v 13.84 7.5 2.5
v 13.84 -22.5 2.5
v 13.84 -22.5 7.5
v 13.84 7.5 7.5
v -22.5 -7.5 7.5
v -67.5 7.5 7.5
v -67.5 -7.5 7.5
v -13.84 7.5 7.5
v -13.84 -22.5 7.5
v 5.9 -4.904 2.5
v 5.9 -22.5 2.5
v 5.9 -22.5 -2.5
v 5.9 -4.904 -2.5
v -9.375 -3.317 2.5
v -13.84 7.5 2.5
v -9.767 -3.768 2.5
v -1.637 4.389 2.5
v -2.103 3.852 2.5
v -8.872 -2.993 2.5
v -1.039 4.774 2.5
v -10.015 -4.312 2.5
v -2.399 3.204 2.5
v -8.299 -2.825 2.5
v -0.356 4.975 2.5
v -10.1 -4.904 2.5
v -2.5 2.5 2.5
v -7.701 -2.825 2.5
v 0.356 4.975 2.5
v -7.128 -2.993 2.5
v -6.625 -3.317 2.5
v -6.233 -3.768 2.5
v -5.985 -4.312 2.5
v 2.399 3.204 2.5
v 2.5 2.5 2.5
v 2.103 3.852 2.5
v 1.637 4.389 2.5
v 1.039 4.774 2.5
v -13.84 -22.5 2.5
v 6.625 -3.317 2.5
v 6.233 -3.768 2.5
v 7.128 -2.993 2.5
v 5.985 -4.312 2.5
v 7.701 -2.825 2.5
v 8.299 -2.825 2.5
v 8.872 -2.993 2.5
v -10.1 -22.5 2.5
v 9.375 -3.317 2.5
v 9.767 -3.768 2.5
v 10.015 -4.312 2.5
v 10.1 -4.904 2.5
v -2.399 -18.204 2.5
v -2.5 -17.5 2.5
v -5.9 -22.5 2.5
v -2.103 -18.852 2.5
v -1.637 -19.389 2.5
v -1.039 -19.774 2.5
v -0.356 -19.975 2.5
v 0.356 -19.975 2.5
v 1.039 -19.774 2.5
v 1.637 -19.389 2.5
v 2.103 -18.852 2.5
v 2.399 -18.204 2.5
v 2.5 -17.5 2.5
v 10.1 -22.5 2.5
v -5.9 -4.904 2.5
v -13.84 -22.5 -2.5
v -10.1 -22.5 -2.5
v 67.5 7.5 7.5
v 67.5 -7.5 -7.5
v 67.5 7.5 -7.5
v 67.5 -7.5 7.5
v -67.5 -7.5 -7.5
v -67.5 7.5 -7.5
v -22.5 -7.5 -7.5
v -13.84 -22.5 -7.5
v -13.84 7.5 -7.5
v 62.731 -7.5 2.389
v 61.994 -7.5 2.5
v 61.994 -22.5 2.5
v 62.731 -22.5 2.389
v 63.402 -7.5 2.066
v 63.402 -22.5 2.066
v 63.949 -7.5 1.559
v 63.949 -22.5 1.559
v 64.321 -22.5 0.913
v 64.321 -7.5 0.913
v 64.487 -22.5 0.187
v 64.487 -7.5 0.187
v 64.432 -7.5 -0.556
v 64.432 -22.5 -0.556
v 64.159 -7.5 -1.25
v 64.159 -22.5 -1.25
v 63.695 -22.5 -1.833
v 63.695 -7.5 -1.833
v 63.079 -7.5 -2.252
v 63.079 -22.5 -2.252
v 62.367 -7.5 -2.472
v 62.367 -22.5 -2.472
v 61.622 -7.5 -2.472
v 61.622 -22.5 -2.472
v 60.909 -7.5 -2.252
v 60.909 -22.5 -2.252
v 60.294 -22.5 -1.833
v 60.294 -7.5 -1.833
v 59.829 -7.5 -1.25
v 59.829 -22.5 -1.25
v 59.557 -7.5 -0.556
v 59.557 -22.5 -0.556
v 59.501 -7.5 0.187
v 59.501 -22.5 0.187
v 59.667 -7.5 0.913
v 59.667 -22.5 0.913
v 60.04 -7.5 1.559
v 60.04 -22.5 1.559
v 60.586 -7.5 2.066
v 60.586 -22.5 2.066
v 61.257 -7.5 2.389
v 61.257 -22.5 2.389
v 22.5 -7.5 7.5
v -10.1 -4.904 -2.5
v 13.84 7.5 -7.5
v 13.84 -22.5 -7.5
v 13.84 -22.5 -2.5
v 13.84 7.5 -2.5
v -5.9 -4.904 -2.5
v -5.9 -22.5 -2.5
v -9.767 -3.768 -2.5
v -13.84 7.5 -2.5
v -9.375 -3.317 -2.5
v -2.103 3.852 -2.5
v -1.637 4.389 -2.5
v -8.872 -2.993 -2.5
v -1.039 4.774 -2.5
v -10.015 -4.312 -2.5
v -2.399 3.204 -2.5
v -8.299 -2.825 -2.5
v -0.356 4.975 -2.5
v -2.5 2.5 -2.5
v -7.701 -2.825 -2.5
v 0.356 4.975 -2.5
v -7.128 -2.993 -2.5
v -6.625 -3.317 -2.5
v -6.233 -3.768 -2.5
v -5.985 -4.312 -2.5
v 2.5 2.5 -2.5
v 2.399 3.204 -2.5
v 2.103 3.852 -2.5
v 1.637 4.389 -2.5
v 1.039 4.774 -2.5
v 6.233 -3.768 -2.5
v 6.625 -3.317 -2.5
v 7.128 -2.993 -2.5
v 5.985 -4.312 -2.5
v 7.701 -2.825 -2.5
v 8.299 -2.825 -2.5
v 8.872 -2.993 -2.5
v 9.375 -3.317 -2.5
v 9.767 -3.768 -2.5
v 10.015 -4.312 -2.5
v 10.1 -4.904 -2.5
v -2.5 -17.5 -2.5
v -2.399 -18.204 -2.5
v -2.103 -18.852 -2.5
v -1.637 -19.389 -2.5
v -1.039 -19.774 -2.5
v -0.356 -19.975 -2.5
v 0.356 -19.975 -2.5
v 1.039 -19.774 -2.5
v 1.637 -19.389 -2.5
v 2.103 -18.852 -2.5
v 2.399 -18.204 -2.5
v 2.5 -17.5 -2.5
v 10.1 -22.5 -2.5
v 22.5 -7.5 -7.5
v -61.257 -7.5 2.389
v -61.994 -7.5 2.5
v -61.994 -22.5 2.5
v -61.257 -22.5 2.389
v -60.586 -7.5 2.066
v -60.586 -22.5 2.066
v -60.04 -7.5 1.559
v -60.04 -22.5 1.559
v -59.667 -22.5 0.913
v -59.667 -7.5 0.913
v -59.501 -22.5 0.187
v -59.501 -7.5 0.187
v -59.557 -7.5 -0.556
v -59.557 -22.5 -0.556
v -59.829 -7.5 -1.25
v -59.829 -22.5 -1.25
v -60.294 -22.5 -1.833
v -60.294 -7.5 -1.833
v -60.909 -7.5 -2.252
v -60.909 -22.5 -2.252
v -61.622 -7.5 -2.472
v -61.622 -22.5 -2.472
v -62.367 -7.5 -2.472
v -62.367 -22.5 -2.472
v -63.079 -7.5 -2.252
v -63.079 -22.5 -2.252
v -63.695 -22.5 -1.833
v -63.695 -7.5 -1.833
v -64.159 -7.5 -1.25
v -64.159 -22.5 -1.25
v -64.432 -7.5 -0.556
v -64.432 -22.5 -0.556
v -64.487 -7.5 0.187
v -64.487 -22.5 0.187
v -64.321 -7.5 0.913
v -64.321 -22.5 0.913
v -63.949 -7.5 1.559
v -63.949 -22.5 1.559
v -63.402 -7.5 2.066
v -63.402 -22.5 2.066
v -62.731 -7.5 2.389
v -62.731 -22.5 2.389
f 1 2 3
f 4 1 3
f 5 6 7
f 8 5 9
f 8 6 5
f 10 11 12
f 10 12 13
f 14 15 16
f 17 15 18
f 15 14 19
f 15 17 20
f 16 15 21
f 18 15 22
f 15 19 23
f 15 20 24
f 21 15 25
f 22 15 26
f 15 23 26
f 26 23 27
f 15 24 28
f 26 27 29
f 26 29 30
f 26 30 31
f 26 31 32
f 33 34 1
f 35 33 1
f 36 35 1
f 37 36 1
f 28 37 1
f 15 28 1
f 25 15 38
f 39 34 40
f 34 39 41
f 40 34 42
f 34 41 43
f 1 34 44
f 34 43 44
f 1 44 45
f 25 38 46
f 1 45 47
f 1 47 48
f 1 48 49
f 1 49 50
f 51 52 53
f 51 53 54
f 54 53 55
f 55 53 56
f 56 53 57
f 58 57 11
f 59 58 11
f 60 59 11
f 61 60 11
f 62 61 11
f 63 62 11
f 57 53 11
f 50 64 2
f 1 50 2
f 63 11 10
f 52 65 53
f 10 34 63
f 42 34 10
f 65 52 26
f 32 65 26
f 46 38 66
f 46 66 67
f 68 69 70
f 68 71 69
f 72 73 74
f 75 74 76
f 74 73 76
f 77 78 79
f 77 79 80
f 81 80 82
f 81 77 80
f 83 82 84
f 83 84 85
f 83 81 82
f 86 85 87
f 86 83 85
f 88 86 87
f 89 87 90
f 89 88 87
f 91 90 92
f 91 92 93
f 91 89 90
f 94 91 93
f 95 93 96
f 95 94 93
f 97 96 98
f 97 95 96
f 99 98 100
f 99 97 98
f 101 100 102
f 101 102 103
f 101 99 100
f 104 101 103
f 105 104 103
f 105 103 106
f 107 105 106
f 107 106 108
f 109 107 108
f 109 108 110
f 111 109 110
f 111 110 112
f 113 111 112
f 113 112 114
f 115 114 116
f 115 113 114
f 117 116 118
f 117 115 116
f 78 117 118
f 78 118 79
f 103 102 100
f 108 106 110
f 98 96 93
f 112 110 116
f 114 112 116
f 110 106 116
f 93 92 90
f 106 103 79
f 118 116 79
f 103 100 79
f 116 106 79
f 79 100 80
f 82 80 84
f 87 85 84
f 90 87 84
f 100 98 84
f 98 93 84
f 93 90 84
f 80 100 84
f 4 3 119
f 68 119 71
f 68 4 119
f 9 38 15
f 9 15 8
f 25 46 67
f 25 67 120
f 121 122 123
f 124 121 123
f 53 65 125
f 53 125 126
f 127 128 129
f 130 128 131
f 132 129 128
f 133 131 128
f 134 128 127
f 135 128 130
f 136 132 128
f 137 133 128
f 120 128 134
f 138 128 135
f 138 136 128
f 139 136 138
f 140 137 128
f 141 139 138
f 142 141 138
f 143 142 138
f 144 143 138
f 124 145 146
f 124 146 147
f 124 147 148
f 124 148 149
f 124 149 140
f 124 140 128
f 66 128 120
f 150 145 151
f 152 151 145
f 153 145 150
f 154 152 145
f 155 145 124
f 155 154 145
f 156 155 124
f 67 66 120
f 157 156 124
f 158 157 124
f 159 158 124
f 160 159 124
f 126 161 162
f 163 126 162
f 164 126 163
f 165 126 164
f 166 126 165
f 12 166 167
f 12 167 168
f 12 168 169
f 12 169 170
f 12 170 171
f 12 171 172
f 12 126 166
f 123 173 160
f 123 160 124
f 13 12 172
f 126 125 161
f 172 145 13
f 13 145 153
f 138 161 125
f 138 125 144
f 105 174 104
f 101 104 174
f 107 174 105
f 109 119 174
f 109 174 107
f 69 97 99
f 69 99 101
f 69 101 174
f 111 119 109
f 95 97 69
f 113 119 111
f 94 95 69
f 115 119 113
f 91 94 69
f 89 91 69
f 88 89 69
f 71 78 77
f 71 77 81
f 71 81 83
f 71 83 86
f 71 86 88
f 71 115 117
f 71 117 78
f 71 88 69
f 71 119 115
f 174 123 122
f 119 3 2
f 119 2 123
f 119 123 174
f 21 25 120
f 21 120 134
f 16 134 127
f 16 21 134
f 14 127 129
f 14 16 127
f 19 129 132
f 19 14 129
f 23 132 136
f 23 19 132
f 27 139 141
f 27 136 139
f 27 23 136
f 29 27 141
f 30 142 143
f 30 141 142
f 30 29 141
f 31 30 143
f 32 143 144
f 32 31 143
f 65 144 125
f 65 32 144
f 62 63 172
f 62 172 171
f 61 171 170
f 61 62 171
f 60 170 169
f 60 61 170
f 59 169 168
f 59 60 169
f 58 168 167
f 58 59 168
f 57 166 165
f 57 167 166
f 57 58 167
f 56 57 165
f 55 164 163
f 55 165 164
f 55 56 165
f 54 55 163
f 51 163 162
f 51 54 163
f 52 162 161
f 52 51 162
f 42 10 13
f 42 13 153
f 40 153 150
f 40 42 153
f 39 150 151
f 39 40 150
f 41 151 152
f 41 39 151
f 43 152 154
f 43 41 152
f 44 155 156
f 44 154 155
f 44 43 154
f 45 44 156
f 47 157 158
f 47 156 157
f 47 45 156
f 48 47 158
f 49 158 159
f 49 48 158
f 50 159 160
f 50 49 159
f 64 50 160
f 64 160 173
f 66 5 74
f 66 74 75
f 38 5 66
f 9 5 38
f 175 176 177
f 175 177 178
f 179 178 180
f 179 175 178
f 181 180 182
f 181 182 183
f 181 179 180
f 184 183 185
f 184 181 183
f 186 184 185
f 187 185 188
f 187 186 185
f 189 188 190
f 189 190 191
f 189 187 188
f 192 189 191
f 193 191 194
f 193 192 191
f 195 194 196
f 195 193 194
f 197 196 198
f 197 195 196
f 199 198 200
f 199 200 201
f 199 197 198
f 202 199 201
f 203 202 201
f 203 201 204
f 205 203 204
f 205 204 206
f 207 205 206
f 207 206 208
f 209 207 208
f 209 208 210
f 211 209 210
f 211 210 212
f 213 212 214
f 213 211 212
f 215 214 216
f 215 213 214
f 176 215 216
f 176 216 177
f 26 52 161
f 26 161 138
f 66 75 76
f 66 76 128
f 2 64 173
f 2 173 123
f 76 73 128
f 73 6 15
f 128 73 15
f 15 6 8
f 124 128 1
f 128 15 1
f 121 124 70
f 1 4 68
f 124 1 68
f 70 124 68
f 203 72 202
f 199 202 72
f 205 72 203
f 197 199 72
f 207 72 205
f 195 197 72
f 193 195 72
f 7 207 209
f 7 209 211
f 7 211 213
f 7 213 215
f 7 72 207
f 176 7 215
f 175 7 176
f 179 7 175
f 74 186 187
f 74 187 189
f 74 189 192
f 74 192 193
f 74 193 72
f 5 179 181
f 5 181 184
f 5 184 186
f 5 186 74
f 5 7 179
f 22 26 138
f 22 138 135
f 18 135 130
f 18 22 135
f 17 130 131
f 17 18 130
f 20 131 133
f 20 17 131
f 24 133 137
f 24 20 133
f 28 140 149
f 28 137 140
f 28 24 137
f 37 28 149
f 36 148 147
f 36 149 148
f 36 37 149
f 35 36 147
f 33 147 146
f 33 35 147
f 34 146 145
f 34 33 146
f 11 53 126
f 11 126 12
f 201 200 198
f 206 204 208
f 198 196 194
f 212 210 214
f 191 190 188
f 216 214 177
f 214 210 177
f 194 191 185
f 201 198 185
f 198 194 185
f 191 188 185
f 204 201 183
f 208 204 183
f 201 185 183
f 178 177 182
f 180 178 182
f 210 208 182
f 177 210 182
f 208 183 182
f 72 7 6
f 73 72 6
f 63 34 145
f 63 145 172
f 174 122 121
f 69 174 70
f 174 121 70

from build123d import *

# Parameters (mm, degrees)
SKETCH1_W           = 135
SKETCH1_H           = 15
BOSS_EXTRUDE1_DEPTH = 7.5
CUT_EXTRUDE1_REACH  = 74.715
CUT_EXTRUDE2_REACH  = 76.246
SKETCH4_W           = 27.679491924
SKETCH4_H           = 5
BOSS_EXTRUDE2_START = -15
SKETCH5_R           = 2.5
BOSS_EXTRUDE2_DEPTH = 15


with BuildPart() as part:
    # Sketch1 → Boss-Extrude1 (new, symmetric)
    with BuildSketch(Plane.XY):
        Rectangle(SKETCH1_W, SKETCH1_H)
        Polygon((22.5, -7.5), (-22.5, -7.5), (-13.839745962, -22.5), (13.839745962, -22.5), align=None)
    extrude(amount=BOSS_EXTRUDE1_DEPTH, both=True)

    # Sketch2 → Cut-Extrude1 (cut, up to next)
    with BuildSketch(Plane.XY.offset(7.5), mode=Mode.PRIVATE) as cut_extrude1_sk1:
        with BuildLine():
            Line((2.5, 2.5), (2.5, -17.5))
            ThreePointArc((2.5, -17.5), (0, -20), (-2.5, -17.5))
            Line((-2.5, -17.5), (-2.5, 2.5))
            ThreePointArc((-2.5, 2.5), (0, 5), (2.5, 2.5))
        make_face()
    cut_extrude1_tool1 = extrude(cut_extrude1_sk1.sketch, amount=-CUT_EXTRUDE1_REACH, mode=Mode.PRIVATE) & part.part
    # Sketch2 → Cut-Extrude1 (cut, up to next)
    with BuildSketch(Plane.XY.offset(7.5), mode=Mode.PRIVATE) as cut_extrude1_sk2:
        with BuildLine():
            Line((10.1, -4.903635329), (10.1, -24.903635329))
            ThreePointArc((10.1, -24.903635329), (8, -27.003635329), (5.9, -24.903635329))
            Line((5.9, -24.903635329), (5.9, -4.903635329))
            ThreePointArc((5.9, -4.903635329), (8, -2.803635329), (10.1, -4.903635329))
        make_face()
    cut_extrude1_tool2 = extrude(cut_extrude1_sk2.sketch, amount=-CUT_EXTRUDE1_REACH, mode=Mode.PRIVATE) & part.part
    # Sketch2 → Cut-Extrude1 (cut, up to next)
    with BuildSketch(Plane.XY.offset(7.5), mode=Mode.PRIVATE) as cut_extrude1_sk3:
        with BuildLine():
            Line((-5.9, -4.903635329), (-5.9, -24.903635329))
            ThreePointArc((-5.9, -24.903635329), (-8, -27.003635329), (-10.1, -24.903635329))
            Line((-10.1, -24.903635329), (-10.1, -4.903635329))
            ThreePointArc((-10.1, -4.903635329), (-8, -2.803635329), (-5.9, -4.903635329))
        make_face()
    cut_extrude1_tool3 = extrude(cut_extrude1_sk3.sketch, amount=-CUT_EXTRUDE1_REACH, mode=Mode.PRIVATE) & part.part
    add(cut_extrude1_tool1.solids().sort_by_distance((0, -7.5, 7.5))[0], mode=Mode.SUBTRACT)
    add(cut_extrude1_tool2.solids().sort_by_distance((8, -14.903635, 7.5))[0], mode=Mode.SUBTRACT)
    add(cut_extrude1_tool3.solids().sort_by_distance((-8, -14.903635, 7.5))[0], mode=Mode.SUBTRACT)

    # Sketch4 → Cut-Extrude2 (cut, up to next)
    with BuildSketch(Plane.XZ.offset(22.5), mode=Mode.PRIVATE) as cut_extrude2_sk1:
        with Locations((0, 5)):
            Rectangle(SKETCH4_W, SKETCH4_H)
    cut_extrude2_tool1 = extrude(cut_extrude2_sk1.sketch, amount=-CUT_EXTRUDE2_REACH, mode=Mode.PRIVATE) & part.part
    # Sketch4 → Cut-Extrude2 (cut, up to next)
    with BuildSketch(Plane.XZ.offset(22.5), mode=Mode.PRIVATE) as cut_extrude2_sk2:
        with Locations((0, -5)):
            Rectangle(SKETCH4_W, SKETCH4_H)
    cut_extrude2_tool2 = extrude(cut_extrude2_sk2.sketch, amount=-CUT_EXTRUDE2_REACH, mode=Mode.PRIVATE) & part.part
    add(cut_extrude2_tool1.solids().sort_by_distance((0, -22.5, 5))[0], mode=Mode.SUBTRACT)
    add(cut_extrude2_tool2.solids().sort_by_distance((0, -22.5, -5))[0], mode=Mode.SUBTRACT)

    # Sketch5 → Boss-Extrude2 (add)
    with BuildSketch(Plane(origin=(0, 7.5, 0), x_dir=(1, 0, 0), z_dir=(0, 1, 0)).offset(BOSS_EXTRUDE2_START)):
        with Locations(Location((61.994193156, 0, 0), (0, 0, 270))):
            Circle(SKETCH5_R)
        with Locations(Location((-61.994193156, 0, 0), (0, 0, 270))):
            Circle(SKETCH5_R)
    extrude(amount=-BOSS_EXTRUDE2_DEPTH)


solid = part.part
